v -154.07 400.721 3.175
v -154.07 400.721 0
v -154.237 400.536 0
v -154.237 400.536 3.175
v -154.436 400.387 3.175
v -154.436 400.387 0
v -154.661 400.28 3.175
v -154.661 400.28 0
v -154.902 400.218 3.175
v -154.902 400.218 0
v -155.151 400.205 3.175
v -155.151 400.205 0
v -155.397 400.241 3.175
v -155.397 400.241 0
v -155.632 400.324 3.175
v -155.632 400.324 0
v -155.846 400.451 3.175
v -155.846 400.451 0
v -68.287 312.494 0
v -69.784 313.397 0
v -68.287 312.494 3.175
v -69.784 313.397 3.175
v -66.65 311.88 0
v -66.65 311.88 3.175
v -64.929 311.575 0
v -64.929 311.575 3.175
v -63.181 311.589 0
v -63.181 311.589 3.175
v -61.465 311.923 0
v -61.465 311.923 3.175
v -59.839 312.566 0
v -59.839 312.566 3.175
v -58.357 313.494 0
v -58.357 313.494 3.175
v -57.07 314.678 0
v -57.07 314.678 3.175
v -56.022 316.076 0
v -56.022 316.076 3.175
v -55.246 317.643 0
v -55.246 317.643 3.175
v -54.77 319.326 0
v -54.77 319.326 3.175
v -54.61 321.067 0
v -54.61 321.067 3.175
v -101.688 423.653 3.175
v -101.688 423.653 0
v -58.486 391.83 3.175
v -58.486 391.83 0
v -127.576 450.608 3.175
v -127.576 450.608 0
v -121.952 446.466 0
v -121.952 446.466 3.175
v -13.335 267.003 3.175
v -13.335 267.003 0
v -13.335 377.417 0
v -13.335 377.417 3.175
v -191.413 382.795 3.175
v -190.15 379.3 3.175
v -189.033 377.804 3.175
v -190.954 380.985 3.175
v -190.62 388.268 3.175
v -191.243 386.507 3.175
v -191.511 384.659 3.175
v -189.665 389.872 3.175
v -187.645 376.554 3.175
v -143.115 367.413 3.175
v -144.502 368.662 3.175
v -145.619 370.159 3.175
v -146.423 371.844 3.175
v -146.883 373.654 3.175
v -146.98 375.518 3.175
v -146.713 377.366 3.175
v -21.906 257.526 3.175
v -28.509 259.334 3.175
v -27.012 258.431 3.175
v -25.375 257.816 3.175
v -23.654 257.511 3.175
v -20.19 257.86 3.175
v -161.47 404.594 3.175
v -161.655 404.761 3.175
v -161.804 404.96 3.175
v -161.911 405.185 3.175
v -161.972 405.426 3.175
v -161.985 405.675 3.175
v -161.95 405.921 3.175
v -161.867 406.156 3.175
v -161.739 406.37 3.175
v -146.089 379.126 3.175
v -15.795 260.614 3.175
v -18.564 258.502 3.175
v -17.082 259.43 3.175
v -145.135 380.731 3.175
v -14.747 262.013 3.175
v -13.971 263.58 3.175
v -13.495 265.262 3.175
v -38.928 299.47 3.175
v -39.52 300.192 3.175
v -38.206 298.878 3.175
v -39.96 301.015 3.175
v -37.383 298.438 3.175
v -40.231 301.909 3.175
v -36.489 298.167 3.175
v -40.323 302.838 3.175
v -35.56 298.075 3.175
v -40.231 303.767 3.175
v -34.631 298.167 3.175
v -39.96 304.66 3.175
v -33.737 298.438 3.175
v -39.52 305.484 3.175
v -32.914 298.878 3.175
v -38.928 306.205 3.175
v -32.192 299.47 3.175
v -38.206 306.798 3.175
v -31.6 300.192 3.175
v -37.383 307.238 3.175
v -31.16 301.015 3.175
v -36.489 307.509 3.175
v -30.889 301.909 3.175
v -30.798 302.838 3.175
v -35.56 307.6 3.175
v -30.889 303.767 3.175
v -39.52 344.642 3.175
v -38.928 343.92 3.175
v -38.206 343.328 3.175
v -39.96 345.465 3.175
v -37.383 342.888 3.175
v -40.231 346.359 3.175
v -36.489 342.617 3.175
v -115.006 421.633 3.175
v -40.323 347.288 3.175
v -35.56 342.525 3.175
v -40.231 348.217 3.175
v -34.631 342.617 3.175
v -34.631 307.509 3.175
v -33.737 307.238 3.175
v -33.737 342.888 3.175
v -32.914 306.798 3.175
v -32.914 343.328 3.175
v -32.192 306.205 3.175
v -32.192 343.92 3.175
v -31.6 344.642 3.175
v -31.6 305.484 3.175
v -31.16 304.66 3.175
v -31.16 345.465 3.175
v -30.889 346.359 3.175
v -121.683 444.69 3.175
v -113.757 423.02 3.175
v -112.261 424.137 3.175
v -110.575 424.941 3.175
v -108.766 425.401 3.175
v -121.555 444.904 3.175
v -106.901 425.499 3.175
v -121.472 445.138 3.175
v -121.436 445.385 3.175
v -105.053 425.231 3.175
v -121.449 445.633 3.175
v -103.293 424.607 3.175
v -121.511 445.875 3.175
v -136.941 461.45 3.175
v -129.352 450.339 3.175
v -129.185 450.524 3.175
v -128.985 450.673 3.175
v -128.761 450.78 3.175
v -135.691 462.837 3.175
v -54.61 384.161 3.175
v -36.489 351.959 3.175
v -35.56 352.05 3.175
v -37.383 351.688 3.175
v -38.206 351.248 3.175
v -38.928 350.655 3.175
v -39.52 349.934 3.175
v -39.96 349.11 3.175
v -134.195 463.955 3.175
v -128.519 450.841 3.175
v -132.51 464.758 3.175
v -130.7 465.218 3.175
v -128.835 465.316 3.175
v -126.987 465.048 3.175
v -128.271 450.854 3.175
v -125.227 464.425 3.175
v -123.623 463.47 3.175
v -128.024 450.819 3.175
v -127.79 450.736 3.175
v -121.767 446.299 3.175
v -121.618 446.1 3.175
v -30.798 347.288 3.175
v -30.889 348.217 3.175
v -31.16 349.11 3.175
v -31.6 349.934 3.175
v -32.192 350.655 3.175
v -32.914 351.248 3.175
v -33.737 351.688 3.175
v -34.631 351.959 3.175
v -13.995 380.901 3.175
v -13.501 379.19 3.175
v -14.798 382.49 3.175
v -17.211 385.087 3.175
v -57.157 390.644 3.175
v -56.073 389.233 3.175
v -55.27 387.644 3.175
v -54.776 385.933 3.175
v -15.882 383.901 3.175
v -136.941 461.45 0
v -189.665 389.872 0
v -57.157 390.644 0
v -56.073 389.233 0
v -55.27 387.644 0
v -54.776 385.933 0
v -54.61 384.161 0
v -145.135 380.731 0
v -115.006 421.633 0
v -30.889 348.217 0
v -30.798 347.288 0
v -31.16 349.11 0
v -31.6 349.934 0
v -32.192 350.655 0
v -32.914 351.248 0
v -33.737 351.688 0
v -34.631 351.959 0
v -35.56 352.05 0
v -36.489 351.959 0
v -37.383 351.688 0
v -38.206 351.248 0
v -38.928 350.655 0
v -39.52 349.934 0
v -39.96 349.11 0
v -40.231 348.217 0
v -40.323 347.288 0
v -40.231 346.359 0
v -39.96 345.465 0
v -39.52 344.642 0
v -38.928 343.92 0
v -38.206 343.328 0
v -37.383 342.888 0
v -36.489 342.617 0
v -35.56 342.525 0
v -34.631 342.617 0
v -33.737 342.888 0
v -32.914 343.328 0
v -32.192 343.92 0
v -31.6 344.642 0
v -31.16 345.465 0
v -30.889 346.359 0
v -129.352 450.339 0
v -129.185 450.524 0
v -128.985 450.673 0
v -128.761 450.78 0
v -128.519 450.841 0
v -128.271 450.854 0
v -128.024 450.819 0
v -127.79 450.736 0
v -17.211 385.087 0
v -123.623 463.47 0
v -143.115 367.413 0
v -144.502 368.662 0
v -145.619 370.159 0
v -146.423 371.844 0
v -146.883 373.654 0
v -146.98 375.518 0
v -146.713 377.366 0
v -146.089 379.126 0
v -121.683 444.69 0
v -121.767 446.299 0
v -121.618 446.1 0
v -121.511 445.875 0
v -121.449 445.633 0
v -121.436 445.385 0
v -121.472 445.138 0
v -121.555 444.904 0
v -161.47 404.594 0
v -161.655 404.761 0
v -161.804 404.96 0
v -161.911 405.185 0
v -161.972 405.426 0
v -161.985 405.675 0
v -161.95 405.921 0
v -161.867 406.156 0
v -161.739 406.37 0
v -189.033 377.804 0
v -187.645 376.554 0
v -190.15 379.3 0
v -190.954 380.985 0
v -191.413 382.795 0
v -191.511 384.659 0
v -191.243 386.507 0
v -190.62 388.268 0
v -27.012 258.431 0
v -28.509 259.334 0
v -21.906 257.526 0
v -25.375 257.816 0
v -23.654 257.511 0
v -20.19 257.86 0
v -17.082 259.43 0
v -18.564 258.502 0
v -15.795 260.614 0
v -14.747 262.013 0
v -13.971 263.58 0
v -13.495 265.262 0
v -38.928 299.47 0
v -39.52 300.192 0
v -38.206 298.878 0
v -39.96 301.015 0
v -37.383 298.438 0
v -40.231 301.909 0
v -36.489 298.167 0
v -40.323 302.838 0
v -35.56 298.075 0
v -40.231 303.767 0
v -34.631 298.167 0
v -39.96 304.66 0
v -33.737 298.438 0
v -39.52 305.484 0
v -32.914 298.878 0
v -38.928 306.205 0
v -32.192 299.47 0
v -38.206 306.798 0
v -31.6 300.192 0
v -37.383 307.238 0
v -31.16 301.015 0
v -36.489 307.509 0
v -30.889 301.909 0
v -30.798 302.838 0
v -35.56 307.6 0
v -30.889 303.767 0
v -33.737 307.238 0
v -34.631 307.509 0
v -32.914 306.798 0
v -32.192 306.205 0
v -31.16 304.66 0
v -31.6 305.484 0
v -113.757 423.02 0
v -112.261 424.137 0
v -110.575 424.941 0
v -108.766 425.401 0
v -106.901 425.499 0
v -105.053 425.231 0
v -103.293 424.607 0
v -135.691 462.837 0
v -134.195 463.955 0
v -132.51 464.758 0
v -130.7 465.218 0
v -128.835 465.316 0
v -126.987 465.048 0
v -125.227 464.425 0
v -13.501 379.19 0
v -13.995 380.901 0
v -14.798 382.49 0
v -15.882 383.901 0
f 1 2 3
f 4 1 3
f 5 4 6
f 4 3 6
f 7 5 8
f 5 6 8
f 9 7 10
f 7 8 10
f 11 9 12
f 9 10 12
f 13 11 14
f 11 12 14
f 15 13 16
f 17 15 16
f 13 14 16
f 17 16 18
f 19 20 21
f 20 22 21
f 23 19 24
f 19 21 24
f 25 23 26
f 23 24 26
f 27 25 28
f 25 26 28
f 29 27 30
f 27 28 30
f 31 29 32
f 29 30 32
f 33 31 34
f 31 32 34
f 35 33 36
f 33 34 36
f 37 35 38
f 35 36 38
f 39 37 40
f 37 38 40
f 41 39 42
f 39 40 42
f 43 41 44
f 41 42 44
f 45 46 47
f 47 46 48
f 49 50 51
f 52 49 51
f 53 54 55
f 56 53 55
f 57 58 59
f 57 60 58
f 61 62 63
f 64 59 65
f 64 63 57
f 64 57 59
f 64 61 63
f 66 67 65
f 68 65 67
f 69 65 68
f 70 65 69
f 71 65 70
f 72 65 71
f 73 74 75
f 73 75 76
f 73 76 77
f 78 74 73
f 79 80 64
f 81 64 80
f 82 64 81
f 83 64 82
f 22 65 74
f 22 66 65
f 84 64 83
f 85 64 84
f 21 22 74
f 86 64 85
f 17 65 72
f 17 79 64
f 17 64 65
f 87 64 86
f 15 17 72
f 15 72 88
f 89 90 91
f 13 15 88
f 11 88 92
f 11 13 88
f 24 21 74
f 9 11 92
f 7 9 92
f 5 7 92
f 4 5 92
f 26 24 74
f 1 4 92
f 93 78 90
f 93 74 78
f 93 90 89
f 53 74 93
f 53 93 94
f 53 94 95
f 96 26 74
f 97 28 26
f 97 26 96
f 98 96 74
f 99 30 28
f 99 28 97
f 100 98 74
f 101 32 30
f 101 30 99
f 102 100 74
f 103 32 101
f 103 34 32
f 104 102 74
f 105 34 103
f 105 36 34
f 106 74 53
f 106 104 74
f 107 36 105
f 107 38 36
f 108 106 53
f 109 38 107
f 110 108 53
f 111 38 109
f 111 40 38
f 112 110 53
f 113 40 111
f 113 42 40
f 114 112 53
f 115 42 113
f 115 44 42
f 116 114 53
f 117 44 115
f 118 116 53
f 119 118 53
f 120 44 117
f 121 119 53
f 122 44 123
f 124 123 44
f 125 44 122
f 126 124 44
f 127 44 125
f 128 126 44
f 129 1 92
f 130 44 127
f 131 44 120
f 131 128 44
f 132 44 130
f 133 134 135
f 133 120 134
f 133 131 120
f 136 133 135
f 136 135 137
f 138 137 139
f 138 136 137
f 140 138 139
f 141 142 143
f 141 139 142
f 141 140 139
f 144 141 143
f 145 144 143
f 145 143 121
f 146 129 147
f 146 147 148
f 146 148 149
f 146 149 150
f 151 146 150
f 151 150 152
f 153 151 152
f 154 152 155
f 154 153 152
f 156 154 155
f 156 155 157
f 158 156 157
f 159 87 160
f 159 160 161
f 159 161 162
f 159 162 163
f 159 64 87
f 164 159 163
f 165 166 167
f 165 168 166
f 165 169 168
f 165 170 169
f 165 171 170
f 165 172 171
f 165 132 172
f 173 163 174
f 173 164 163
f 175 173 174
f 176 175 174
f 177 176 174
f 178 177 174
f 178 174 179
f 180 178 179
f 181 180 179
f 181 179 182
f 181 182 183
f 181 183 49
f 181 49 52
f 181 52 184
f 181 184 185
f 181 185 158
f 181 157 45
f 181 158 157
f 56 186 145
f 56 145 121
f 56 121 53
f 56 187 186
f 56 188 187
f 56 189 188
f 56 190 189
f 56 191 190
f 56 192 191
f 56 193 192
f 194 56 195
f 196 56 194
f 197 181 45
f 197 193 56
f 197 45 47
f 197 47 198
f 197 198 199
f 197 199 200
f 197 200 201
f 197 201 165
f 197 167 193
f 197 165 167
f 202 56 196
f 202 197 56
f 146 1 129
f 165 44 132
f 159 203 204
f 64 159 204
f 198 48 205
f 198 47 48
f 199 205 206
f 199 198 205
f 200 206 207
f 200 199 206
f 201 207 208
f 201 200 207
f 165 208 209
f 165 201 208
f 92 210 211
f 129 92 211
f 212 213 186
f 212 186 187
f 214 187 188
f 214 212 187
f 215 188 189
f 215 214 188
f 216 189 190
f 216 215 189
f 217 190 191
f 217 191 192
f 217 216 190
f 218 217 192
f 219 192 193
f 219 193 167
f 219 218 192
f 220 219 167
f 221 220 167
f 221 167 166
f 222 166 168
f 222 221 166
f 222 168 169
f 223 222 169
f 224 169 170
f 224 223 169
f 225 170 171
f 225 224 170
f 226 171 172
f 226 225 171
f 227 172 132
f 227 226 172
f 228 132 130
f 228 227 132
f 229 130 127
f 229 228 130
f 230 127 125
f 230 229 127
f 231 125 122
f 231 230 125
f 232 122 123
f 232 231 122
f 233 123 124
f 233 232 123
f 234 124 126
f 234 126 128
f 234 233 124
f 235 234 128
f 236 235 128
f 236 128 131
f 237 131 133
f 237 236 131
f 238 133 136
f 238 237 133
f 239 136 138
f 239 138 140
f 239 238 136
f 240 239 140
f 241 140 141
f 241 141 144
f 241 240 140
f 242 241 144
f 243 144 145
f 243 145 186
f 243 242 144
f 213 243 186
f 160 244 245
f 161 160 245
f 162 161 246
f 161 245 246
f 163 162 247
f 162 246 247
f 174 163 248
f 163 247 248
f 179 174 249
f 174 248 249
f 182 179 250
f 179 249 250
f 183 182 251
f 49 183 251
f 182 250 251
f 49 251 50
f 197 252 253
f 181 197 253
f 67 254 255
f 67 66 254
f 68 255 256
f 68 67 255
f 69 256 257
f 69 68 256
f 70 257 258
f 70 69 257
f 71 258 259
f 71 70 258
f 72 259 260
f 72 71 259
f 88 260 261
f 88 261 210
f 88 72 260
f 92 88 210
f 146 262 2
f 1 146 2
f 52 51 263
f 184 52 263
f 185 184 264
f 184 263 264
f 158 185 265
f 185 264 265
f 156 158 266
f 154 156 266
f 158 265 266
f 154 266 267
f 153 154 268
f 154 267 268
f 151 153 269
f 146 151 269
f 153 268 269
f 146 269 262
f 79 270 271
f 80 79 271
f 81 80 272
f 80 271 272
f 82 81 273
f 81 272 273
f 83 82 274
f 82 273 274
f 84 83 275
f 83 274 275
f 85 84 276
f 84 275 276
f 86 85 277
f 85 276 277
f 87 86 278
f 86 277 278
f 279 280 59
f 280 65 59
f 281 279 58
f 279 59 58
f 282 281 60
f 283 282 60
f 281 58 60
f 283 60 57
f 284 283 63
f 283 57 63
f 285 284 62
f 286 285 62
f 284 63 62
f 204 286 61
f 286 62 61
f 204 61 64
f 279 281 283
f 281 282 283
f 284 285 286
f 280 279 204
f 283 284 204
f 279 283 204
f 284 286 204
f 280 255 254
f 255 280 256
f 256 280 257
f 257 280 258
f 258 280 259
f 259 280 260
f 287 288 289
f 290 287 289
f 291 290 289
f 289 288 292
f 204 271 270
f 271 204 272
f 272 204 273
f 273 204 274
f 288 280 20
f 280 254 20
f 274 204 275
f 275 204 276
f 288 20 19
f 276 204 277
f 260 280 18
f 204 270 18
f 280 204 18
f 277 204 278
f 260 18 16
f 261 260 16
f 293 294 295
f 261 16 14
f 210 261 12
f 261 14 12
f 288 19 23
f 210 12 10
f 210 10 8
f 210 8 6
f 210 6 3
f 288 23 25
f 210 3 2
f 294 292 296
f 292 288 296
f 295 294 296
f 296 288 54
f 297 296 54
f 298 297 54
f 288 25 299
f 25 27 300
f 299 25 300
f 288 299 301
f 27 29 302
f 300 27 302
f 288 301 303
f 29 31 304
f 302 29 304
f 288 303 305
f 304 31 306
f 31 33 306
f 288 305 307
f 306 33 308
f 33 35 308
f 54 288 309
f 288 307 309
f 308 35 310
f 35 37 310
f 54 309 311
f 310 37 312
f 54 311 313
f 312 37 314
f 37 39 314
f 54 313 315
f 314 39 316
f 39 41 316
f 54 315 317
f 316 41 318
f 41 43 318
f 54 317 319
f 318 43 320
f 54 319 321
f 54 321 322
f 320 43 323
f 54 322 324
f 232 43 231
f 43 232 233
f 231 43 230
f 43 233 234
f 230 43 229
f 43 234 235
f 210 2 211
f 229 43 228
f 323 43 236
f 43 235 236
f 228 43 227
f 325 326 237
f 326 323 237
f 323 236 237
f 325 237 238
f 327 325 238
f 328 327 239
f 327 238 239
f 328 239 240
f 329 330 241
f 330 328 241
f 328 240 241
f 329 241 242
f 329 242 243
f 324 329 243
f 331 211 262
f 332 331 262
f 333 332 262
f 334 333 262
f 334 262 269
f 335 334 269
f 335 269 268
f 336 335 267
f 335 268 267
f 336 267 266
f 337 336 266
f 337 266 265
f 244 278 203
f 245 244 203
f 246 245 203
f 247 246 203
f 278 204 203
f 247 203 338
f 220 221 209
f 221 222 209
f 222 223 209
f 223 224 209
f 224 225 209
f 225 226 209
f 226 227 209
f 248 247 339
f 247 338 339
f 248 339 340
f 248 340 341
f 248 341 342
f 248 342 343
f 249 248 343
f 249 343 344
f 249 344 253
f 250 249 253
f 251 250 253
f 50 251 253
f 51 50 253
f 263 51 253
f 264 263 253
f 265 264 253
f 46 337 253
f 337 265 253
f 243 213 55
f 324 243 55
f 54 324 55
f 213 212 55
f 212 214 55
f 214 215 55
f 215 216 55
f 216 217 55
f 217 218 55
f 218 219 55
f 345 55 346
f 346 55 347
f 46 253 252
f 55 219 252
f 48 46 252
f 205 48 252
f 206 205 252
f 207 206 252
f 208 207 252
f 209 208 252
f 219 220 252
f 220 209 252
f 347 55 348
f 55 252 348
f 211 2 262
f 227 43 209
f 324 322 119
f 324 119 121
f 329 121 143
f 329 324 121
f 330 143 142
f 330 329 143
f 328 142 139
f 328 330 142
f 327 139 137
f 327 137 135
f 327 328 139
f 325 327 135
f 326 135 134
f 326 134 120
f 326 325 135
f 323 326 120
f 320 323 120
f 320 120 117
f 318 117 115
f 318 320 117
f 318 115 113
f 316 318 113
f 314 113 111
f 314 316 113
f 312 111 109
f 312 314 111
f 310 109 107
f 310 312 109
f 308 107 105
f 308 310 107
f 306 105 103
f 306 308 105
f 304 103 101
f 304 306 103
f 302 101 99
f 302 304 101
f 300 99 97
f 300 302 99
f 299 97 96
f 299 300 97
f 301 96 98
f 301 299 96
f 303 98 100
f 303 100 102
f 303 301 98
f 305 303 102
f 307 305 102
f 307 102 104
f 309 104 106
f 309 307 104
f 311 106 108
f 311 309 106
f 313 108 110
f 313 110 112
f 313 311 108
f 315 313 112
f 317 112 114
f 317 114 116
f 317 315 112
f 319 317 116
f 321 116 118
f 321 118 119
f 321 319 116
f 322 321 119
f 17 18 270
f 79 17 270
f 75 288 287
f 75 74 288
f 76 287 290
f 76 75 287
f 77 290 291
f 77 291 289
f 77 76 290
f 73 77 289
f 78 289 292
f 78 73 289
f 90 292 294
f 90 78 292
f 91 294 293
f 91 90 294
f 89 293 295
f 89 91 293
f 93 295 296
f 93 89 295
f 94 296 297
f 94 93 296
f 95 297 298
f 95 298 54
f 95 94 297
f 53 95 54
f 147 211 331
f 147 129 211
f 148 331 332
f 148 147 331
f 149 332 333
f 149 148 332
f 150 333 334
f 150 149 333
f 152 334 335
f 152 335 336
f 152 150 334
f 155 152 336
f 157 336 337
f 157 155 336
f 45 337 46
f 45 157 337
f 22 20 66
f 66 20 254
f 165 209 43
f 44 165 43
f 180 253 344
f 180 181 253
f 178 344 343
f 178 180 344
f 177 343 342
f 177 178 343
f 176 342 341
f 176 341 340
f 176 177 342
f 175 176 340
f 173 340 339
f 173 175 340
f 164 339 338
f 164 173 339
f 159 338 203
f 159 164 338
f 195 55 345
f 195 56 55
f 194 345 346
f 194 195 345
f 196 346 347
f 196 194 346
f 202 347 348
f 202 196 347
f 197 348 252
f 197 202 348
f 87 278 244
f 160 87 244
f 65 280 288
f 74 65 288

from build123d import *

# Parameters (mm, degrees)
SKETCH1_R           = 4.7625
BOSS_EXTRUDE1_DEPTH = 3.175
FILLET1_R           = 9.525


with BuildPart() as part:
    # Sketch1 → Boss-Extrude1 (new body)
    with BuildSketch(Plane.XY):
        Polygon((-195.314090033, 382.203190117), (-13.335, 248.156621006), (-13.335, 382.231468598), (-131.291653964, 469.118839915), align=None)
        with Locations((-35.56, 302.837639338)):
            Circle(SKETCH1_R, mode=Mode.SUBTRACT)
        with Locations((-35.56, 347.287639338)):
            Circle(SKETCH1_R, mode=Mode.SUBTRACT)
        with BuildLine():
            ThreePointArc((-154.070332508, 400.720749088), (-154.902423133, 400.218314877), (-155.846074695, 400.451417162))
            Line((-155.846074695, 400.451417162), (-161.470028505, 404.594045378))
            ThreePointArc((-161.470028505, 404.594045378), (-161.972462717, 405.426136003), (-161.739360431, 406.369787565))
            Line((-161.739360431, 406.369787565), (-129.351539832, 450.338880992))
            ThreePointArc((-129.351539832, 450.338880992), (-128.519449207, 450.841315204), (-127.575797645, 450.608212918))
            Line((-127.575797645, 450.608212918), (-121.951843834, 446.465584702))
            ThreePointArc((-121.951843834, 446.465584702), (-121.449409623, 445.633494077), (-121.682511908, 444.689842516))
            Line((-121.682511908, 444.689842516), (-154.070332508, 400.720749088))
        make_face(mode=Mode.SUBTRACT)
        Polygon((-150.783558745, 373.062079232), (-109.357276582, 429.301617336), (-54.61, 388.974541337), (-54.61, 302.220228189), (-96.036282162, 332.735003232), align=None, mode=Mode.SUBTRACT)
    extrude(amount=BOSS_EXTRUDE1_DEPTH)

    # Fillet1
    fillet1_edges = [part.edges().sort_by_distance(p)[0] for p in [
        (-54.61, 388.974541337, 1.5875),
        (-109.357276582, 429.301617336, 1.5875),
        (-150.783558745, 373.062079232, 1.5875),
        (-54.61, 302.220228189, 1.5875),
        (-131.291653964, 469.118839915, 1.5875),
        (-13.335, 382.231468598, 1.5875),
        (-13.335, 248.156621006, 1.5875),
        (-195.314090033, 382.203190117, 1.5875),
    ]]
    fillet(fillet1_edges, radius=FILLET1_R)


solid = part.part
